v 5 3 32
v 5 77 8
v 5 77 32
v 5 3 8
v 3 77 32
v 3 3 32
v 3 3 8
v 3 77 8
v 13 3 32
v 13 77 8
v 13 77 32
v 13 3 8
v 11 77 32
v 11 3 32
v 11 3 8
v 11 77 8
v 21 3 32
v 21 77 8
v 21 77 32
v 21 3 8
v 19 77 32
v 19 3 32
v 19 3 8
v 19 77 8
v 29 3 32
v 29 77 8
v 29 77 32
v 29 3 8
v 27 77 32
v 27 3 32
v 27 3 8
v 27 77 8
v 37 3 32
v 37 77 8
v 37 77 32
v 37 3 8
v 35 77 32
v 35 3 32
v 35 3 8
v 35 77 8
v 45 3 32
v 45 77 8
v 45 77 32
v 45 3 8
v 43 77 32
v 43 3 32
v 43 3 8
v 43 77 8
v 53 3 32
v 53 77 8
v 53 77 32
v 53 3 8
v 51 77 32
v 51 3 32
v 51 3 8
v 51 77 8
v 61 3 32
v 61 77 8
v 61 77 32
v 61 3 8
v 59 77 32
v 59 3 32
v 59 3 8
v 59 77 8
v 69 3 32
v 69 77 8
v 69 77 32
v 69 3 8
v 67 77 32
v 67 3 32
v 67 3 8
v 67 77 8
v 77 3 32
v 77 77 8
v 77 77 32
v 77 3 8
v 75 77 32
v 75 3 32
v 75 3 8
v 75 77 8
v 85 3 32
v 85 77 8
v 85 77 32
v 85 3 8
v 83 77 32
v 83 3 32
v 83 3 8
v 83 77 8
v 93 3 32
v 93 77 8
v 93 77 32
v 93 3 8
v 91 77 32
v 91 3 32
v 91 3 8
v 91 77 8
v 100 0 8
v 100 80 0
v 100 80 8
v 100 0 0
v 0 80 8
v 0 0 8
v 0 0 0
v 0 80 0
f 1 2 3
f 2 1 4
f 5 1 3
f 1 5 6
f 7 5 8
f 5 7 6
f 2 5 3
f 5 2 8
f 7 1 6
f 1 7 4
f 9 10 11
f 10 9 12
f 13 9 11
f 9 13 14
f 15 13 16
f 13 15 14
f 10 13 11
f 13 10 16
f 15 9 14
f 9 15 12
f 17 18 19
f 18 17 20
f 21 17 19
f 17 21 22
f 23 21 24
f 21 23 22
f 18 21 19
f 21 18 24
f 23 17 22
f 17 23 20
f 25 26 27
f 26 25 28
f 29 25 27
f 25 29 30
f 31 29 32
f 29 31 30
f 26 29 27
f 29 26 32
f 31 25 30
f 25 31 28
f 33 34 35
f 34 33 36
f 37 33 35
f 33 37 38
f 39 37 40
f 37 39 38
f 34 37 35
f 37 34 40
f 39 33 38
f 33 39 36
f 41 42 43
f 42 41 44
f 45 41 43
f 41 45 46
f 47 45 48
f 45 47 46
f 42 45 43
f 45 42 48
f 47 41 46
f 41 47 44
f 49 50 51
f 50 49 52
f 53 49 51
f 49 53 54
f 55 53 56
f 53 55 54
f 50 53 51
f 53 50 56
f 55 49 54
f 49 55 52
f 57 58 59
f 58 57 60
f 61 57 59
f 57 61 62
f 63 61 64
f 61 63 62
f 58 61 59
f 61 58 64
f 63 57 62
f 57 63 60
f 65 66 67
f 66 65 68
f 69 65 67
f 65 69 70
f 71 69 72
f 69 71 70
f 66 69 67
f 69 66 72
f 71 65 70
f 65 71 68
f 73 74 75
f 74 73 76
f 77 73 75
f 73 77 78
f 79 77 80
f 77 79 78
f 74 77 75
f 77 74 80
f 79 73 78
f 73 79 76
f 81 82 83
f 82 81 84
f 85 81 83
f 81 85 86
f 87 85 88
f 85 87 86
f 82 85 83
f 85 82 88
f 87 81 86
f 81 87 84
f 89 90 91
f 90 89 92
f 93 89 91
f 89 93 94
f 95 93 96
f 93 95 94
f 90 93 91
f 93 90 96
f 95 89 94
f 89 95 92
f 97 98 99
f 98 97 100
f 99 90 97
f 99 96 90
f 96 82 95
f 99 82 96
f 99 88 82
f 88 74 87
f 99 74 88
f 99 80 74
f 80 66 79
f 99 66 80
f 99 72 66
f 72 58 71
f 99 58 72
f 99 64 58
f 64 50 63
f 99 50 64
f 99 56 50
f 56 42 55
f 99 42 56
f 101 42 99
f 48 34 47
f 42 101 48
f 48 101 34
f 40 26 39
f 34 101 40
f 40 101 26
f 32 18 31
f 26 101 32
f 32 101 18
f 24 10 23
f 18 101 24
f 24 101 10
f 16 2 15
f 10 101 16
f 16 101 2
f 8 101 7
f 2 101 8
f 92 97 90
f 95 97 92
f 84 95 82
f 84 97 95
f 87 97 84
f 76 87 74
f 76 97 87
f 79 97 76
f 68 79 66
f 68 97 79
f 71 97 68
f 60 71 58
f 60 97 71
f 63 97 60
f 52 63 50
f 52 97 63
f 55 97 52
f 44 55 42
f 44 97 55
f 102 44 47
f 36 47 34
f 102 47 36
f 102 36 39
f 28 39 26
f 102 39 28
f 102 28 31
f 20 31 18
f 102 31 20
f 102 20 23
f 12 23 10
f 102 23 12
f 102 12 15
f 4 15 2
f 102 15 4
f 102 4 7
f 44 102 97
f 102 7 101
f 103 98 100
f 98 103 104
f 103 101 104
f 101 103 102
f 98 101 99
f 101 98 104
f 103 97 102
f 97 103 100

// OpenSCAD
$fn = 32;

// ----------------------------------------------------------------------
// Heatsink: uniform fin block
// ----------------------------------------------------------------------

// --- parameters (mm) ---
base_l = 100;             // base length, X
base_w = 80;              // base width, Y
base_t = 8;               // base plate thickness
fin_h = 25;               // fin height above the base
fin_t = 2;                // fin thickness
edge = 3;                 // margin from the base ends
pitch = 8;                // fin pitch
fit_tol = 0.05;           // tolerance for press fits, mm
free_tol = 0.2;           // tolerance for clearance fits, mm

n_fins = floor((base_l - 2 * edge - fin_t) / pitch) + 1;  // fin count
total_h = base_t + fin_h - 1;  // overall height

union() {
  cube([base_l, base_w, base_t]);
  for (i = [0 : n_fins - 1])
    translate([edge + i * pitch, edge, base_t - 1])
      cube([fin_t, base_w - 2 * edge, fin_h]);
}
